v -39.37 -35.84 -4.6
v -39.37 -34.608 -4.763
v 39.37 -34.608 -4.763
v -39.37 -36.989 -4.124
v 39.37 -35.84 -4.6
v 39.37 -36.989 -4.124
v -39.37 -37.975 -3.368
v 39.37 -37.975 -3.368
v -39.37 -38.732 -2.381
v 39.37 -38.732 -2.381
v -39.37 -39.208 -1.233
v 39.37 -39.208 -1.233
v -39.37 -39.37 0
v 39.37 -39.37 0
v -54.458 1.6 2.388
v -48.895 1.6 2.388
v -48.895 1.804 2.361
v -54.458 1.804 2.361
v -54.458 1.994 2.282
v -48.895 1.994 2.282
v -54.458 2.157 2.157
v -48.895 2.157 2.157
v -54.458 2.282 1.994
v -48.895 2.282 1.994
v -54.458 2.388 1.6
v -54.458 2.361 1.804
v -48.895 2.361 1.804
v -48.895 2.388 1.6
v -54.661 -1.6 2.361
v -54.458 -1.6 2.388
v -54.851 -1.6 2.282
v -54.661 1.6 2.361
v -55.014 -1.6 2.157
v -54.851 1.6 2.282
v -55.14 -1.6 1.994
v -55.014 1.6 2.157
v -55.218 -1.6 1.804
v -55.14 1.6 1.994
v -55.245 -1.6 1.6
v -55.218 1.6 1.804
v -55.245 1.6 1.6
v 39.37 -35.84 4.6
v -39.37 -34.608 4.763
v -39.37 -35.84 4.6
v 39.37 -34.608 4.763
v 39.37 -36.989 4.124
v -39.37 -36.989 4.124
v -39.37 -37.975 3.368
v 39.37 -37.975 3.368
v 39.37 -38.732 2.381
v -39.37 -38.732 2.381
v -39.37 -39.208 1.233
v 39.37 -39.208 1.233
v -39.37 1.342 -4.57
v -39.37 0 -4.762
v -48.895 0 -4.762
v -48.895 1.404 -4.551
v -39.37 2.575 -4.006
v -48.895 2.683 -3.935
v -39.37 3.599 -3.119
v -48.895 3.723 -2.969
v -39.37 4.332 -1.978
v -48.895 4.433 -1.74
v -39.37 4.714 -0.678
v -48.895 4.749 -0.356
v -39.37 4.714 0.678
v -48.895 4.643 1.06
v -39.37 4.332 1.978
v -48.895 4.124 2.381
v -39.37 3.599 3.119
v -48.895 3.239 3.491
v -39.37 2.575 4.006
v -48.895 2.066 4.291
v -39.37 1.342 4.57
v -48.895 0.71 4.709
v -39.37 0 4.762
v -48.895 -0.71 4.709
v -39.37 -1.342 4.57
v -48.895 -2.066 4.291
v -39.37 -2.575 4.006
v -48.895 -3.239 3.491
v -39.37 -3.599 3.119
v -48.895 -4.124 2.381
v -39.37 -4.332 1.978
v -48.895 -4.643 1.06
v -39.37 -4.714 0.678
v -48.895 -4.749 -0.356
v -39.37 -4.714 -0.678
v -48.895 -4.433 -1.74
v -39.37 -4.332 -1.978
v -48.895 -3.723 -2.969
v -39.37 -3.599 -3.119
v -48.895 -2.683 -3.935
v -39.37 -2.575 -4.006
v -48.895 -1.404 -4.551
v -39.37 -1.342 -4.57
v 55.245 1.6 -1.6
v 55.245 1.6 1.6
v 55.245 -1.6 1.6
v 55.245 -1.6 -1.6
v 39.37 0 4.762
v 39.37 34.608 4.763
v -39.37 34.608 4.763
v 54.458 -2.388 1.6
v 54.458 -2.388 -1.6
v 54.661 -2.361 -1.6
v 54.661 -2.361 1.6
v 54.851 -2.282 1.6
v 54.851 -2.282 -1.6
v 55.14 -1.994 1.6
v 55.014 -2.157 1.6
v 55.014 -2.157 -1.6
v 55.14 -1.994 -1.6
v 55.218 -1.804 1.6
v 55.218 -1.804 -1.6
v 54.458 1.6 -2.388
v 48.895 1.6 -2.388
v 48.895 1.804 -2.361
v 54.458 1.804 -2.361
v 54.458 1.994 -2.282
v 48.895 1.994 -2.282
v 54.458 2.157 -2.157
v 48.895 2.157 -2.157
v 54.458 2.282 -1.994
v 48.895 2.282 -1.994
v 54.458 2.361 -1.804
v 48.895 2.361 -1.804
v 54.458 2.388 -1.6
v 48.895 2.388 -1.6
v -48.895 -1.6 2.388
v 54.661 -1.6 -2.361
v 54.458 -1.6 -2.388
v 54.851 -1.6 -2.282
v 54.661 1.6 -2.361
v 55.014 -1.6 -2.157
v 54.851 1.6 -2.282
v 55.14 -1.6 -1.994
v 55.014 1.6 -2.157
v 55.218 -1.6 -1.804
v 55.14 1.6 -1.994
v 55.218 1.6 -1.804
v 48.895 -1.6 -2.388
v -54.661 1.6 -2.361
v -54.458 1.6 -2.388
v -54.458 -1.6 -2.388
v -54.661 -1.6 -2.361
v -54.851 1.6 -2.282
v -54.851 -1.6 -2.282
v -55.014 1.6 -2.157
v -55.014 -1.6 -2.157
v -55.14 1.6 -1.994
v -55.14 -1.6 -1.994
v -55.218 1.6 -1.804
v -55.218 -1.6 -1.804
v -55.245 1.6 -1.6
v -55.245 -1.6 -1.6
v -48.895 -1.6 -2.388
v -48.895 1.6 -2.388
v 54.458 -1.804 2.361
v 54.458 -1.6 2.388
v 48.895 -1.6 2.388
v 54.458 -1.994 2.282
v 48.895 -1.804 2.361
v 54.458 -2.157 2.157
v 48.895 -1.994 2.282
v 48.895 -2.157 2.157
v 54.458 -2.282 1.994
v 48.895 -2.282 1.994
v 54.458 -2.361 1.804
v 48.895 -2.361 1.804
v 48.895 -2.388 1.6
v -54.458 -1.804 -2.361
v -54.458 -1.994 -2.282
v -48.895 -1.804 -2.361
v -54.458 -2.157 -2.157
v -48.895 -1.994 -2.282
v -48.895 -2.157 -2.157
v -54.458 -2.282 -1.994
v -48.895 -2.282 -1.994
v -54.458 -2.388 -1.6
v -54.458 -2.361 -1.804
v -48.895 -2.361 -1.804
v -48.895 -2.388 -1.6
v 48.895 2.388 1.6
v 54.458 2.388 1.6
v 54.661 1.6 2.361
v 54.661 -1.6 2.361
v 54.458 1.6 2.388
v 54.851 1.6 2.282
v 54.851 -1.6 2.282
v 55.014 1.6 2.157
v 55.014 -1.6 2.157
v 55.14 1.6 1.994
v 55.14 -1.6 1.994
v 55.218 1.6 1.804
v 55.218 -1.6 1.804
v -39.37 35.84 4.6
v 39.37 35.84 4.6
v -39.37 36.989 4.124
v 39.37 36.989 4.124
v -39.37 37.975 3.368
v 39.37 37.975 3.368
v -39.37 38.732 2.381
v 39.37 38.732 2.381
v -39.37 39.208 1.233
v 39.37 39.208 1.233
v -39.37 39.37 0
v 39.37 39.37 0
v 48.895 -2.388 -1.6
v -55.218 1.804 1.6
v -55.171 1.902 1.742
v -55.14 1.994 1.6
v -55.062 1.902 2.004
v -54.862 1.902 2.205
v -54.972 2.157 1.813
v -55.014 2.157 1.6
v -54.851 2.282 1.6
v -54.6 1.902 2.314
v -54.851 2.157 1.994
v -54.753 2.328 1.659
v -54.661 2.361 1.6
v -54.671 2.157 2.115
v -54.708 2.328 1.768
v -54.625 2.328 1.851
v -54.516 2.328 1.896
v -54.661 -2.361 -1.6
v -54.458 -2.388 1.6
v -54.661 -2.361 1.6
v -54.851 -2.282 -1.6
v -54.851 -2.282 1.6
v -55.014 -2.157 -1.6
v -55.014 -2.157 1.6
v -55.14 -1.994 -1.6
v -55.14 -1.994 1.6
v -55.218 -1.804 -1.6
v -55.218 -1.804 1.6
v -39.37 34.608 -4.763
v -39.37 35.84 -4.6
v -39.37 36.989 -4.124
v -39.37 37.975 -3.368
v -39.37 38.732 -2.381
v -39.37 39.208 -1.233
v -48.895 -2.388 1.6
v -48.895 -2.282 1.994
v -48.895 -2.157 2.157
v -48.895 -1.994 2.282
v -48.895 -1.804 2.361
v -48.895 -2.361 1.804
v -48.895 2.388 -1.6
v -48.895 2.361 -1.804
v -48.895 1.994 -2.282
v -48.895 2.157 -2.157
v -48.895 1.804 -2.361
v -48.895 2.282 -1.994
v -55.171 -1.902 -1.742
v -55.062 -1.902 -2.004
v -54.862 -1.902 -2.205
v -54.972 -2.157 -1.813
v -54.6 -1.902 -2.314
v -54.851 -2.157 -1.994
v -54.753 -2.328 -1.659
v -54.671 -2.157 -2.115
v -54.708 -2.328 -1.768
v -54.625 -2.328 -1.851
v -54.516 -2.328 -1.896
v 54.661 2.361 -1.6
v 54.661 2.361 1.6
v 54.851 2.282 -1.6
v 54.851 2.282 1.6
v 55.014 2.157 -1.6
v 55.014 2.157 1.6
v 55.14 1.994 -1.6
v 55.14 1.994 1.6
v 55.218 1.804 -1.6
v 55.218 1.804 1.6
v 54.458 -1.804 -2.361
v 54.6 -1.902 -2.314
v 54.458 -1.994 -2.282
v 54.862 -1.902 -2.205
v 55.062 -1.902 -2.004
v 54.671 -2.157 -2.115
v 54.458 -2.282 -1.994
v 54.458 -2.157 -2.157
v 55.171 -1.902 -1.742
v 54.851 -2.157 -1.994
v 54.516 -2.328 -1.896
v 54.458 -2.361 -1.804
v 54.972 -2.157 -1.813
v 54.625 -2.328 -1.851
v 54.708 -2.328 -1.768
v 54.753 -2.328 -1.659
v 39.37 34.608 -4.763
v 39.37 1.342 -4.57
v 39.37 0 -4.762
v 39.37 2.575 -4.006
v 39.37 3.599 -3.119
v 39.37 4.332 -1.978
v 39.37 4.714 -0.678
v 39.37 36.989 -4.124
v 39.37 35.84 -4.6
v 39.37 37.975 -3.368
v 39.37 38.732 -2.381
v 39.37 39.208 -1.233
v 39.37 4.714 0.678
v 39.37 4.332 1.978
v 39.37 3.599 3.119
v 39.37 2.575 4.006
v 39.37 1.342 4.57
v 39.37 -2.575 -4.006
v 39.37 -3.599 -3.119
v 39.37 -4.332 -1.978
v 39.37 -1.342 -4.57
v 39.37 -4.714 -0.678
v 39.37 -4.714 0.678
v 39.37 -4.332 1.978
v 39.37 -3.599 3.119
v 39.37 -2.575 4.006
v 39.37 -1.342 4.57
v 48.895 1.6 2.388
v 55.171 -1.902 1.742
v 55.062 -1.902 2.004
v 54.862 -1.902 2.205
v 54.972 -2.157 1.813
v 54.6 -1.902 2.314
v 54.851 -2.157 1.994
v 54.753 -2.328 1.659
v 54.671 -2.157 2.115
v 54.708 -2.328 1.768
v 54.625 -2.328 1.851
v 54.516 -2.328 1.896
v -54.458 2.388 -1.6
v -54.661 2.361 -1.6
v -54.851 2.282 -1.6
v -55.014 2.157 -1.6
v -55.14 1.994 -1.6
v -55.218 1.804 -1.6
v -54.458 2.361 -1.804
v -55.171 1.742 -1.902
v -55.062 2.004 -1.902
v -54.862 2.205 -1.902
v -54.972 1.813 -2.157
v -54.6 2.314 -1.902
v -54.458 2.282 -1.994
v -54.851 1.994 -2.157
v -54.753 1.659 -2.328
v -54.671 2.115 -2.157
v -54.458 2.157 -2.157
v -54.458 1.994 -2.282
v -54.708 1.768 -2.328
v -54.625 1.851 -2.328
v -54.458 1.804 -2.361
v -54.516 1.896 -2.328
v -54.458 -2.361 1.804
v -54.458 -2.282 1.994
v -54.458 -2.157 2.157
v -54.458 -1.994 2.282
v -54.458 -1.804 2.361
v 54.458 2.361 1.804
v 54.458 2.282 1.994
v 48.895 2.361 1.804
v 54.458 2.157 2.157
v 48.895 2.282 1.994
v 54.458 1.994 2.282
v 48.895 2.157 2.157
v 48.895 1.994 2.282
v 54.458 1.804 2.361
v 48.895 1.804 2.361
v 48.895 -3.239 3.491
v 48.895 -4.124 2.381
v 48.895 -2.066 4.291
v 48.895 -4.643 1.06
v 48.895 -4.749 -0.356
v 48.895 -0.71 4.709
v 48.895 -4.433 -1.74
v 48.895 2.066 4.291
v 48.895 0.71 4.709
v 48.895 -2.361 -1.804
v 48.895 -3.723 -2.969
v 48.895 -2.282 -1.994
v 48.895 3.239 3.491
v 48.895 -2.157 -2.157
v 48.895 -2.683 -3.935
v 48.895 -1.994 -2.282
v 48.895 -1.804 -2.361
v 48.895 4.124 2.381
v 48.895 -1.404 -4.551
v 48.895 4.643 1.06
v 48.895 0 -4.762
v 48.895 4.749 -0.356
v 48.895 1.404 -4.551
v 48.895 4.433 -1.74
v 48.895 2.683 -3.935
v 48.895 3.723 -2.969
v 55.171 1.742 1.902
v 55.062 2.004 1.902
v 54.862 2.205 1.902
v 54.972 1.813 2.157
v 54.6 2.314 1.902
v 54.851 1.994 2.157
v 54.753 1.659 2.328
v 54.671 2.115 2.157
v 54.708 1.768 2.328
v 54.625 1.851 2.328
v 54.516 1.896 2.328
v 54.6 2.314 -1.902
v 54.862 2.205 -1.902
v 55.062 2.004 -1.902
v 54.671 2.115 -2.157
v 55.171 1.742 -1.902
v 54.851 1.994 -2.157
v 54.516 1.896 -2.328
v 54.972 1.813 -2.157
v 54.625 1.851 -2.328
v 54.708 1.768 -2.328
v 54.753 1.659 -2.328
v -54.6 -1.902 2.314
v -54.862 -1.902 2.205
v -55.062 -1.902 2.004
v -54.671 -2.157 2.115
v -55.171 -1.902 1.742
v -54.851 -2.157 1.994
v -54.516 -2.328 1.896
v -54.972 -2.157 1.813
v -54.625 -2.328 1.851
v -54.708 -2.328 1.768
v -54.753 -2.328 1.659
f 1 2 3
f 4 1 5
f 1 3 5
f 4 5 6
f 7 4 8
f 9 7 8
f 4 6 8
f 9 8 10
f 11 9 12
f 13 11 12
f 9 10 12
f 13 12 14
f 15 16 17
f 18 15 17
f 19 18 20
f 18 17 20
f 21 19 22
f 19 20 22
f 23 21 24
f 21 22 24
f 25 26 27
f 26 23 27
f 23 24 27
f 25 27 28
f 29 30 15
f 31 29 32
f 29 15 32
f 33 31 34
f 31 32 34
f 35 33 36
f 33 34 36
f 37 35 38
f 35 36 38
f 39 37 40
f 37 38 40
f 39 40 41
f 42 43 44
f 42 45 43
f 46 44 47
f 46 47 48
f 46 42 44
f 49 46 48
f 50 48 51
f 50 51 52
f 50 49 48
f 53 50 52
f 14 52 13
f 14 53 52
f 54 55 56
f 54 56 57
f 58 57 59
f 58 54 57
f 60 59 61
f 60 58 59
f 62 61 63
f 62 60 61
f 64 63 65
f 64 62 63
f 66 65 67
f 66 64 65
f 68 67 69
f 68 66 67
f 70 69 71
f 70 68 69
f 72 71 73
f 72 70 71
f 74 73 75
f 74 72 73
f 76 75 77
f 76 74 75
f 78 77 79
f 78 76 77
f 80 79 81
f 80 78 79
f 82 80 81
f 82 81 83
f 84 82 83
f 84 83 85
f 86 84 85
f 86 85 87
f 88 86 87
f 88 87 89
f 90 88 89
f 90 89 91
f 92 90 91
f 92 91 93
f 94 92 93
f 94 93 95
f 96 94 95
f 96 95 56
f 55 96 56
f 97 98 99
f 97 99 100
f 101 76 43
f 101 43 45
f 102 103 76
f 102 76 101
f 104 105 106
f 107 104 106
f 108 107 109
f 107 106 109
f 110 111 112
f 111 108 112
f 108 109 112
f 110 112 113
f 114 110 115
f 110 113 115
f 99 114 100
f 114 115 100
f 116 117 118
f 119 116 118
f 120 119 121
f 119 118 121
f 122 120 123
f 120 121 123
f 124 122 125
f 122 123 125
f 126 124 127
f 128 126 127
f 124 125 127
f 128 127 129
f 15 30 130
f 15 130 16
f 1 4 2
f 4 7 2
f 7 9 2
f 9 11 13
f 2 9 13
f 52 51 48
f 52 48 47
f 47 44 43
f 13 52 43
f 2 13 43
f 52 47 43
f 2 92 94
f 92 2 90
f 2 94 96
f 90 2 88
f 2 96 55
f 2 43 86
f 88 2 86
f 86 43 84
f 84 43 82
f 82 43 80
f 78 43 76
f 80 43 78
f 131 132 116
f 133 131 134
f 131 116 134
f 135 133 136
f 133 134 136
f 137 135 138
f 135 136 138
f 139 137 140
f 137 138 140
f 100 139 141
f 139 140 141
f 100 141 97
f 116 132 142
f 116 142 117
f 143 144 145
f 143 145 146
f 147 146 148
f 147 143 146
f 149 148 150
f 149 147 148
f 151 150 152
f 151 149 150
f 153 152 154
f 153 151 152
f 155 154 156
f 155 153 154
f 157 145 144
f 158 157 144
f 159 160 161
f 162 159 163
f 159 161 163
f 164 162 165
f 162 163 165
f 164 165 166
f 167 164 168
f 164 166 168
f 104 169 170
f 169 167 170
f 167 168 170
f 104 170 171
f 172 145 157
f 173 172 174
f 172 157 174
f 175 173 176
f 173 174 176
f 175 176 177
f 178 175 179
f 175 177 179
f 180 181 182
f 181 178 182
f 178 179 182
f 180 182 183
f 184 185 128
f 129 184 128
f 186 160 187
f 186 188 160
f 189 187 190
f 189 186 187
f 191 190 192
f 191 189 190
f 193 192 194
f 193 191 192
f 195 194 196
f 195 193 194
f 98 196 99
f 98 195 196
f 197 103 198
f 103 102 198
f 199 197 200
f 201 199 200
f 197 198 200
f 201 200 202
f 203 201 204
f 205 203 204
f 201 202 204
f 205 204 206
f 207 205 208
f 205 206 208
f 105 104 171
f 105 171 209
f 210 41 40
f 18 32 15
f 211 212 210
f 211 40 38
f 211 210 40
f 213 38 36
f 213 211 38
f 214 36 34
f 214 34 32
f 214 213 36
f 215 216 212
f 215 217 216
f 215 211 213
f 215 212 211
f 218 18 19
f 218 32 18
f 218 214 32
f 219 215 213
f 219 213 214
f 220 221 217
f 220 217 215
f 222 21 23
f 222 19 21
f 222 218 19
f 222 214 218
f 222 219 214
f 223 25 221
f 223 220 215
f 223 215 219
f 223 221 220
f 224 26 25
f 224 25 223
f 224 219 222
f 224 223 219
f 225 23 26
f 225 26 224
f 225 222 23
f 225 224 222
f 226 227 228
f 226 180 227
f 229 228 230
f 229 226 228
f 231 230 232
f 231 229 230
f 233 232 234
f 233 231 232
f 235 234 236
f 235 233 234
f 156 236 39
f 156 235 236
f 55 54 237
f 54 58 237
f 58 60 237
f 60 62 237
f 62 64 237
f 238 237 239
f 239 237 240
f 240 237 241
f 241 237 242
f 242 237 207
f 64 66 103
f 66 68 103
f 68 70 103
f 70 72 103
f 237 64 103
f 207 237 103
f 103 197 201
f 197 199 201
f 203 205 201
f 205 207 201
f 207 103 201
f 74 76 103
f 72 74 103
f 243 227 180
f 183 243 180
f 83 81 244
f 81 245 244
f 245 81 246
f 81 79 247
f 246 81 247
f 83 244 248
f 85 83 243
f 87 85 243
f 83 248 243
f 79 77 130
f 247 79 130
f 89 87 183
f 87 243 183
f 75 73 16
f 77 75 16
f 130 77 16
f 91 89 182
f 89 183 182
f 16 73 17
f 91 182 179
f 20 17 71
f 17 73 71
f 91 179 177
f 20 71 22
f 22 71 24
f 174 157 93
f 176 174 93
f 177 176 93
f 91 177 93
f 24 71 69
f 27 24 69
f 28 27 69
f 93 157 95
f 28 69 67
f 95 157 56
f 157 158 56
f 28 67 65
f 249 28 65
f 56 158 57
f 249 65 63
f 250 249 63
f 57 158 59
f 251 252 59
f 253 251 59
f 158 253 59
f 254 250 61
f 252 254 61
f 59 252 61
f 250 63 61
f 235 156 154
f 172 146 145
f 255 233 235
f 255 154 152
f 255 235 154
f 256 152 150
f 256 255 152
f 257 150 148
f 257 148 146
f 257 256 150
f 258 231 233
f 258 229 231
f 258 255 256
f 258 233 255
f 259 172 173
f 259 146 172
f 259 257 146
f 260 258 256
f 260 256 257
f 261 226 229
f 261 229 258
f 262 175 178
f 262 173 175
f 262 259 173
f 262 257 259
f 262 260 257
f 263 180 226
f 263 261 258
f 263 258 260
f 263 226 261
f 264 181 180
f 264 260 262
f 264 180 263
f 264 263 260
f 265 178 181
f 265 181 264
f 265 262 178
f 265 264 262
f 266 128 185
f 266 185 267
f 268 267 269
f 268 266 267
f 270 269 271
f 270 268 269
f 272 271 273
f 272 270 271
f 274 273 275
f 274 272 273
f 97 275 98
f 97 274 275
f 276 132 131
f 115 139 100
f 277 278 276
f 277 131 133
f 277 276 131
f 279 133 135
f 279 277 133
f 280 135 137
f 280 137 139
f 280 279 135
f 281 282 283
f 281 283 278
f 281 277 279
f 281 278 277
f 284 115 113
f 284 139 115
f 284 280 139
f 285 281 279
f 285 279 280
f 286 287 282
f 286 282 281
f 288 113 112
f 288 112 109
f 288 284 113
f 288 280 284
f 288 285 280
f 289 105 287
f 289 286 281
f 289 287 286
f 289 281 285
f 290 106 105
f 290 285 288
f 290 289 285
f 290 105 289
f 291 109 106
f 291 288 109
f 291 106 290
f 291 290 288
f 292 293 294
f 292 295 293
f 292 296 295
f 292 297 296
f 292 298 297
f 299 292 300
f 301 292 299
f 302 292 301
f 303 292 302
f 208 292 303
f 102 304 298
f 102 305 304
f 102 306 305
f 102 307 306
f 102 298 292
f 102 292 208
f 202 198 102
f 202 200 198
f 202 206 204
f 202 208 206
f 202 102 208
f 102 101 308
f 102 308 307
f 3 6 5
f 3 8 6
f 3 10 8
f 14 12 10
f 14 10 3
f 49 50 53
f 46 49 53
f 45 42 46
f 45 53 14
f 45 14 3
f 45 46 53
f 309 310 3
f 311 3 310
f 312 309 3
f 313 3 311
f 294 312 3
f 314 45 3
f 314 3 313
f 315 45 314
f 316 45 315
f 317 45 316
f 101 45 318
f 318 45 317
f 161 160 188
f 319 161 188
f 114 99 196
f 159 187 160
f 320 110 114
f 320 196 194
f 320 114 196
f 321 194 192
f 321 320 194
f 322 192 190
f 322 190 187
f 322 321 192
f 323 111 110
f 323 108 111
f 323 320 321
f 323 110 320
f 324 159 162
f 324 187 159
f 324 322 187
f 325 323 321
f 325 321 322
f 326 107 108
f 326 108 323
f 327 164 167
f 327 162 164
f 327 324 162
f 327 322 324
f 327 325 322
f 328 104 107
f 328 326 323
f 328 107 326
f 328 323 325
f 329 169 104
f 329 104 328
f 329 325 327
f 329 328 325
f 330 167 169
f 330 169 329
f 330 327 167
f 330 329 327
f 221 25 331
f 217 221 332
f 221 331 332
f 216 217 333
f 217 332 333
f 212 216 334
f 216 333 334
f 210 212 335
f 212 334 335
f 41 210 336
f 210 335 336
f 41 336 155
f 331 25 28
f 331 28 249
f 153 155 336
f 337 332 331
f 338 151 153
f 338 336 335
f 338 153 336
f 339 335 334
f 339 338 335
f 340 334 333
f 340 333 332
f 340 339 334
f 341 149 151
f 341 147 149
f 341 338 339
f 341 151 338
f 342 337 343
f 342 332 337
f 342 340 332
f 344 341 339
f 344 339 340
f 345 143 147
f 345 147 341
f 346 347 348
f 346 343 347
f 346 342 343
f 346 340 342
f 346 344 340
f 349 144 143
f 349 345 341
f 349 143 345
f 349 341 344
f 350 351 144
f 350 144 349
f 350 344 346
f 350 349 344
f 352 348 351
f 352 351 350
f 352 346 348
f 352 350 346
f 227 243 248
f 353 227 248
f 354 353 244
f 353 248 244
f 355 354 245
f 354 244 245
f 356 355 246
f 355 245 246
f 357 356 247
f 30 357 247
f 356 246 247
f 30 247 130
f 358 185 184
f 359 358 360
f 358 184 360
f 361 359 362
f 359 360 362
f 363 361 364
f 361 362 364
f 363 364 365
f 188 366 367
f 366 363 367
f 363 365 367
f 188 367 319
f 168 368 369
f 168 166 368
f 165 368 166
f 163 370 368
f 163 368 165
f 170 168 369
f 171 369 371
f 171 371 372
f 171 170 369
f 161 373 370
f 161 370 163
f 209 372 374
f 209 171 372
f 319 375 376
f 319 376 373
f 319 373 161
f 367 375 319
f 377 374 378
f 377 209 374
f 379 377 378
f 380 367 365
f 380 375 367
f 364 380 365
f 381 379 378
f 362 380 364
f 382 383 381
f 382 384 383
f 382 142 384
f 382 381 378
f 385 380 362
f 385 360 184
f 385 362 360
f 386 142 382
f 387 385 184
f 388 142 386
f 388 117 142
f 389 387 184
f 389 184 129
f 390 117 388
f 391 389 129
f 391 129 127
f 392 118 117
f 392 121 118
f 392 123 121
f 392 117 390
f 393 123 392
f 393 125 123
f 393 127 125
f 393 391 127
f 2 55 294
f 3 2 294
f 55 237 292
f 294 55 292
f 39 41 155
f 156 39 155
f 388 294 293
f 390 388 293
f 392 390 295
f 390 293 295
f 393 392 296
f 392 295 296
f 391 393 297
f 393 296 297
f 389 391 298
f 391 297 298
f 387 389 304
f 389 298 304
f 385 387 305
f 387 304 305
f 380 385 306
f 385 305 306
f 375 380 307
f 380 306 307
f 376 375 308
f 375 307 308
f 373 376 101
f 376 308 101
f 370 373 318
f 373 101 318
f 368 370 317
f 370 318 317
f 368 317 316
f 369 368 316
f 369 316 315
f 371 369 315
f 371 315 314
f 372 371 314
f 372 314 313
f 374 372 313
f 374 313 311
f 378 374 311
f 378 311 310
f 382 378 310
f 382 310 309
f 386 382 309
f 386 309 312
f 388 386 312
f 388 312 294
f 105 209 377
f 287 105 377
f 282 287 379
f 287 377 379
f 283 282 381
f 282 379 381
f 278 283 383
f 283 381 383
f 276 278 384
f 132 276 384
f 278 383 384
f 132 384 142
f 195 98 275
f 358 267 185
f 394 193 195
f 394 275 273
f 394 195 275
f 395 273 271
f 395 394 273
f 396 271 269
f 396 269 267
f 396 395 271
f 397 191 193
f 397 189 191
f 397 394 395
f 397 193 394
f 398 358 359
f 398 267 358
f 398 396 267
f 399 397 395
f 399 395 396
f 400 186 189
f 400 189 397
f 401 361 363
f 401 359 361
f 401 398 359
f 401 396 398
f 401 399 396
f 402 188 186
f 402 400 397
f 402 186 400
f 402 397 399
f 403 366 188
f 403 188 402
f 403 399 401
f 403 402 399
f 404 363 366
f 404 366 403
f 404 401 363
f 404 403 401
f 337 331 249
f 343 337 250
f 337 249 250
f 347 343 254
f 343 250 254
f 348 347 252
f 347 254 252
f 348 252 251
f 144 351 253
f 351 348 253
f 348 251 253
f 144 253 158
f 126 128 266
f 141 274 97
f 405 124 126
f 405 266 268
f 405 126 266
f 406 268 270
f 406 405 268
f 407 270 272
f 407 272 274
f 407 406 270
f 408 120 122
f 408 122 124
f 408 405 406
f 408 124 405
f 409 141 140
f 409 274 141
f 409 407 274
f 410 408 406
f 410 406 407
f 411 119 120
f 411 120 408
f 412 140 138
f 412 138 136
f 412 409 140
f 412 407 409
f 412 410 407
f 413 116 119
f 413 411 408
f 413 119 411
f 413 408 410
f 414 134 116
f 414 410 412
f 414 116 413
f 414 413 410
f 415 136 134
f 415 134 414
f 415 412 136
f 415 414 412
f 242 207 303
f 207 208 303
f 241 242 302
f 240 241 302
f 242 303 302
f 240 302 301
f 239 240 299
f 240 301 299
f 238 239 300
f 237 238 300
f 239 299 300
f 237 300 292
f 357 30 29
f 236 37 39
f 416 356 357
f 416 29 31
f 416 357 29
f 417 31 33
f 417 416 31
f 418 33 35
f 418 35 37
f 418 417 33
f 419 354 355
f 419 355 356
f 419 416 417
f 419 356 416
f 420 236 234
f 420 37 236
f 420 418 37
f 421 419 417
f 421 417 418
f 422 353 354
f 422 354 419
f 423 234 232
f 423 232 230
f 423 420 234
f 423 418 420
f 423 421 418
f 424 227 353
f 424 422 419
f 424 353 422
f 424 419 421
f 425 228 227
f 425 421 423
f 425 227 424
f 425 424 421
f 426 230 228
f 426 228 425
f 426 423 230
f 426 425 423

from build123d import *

# Parameters (mm, degrees)
SKETCH1_W           = 78.74
SKETCH1_H           = 78.74
BOSS_EXTRUDE1_DEPTH = 4.7625
SKETCH2_R           = 4.7625
BOSS_EXTRUDE2_DEPTH = 9.525
SKETCH3_W           = 4.7752
SKETCH3_H           = 4.7752
BOSS_EXTRUDE3_DEPTH = 6.35
FILLET2_R           = 4.7625
FILLET3_R           = 0.7874
FILLET4_R           = 0.7874
FILLET5_R           = 0.7874


# Some blends are built 0.0001 mm under size
with BuildPart() as part:
    # Sketch1 → Boss-Extrude1 (new, symmetric)
    with BuildSketch(Plane.XY):
        Rectangle(SKETCH1_W, SKETCH1_H)
    extrude(amount=BOSS_EXTRUDE1_DEPTH, both=True)

    # Sketch2 → Boss-Extrude2 (add)
    with BuildSketch(Plane(origin=(39.37, 0, 0), x_dir=(0, 0, -1), z_dir=(1, 0, 0))):
        Circle(SKETCH2_R)
    boss_extrude2 = extrude(amount=BOSS_EXTRUDE2_DEPTH)

    # Sketch3 → Boss-Extrude3 (add)
    with BuildSketch(Plane(origin=(48.895, 0, 0), x_dir=(0, 0, -1), z_dir=(1, 0, 0))):
        Rectangle(SKETCH3_W, SKETCH3_H)
    boss_extrude3 = extrude(amount=BOSS_EXTRUDE3_DEPTH)

    # Mirror1: Boss-Extrude2, Boss-Extrude3 across plane
    add(boss_extrude2.mirror(Plane(origin=(0, 0, 0), x_dir=(0, 0, 1), z_dir=(1, 0, 0))))
    add(boss_extrude3.mirror(Plane(origin=(0, 0, 0), x_dir=(0, 0, 1), z_dir=(1, 0, 0))))

    # Fillet2
    fillet2_edges = [part.edges().sort_by_distance(p)[0] for p in [
        (0, -39.37, -4.7625),
        (0, -39.37, 4.7625),
        (0, 39.37, -4.7625),
        (0, 39.37, 4.7625),
    ]]
    fillet(fillet2_edges, radius=FILLET2_R - 0.0001)  # a hair under: the kernel refuses the full size

    # Fillet3
    fillet3_edges = [part.edges().sort_by_distance(p)[0] for p in [
        (-55.245, 0, -2.3876),
        (-55.245, -2.3876, 0),
        (-55.245, 0, 2.3876),
        (-55.245, 2.3876, 0),
    ]]
    fillet(fillet3_edges, radius=FILLET3_R)

    # Fillet4
    fillet4_edges = [part.edges().sort_by_distance(p)[0] for p in [
        (55.245, 0, -2.3876),
        (55.245, 2.3876, 0),
        (55.245, 0, 2.3876),
        (55.245, -2.3876, 0),
    ]]
    fillet(fillet4_edges, radius=FILLET4_R)

    # Fillet5
    # the kernel refuses this fillet: 0.7874 mm, written as the material it takes off along each edge
    with BuildSketch(Plane(origin=(54.4576, -1.6002, -1.6002), x_dir=(0, 0, -1), z_dir=(0, -1, 0))) as fillet5_piece_1_section:
        Polygon((0, 0), (FILLET5_R, 0), (FILLET5_R, FILLET5_R), (0, FILLET5_R), align=None)
    fillet5_piece_1 = extrude(amount=FILLET5_R, mode=Mode.PRIVATE)
    fillet5_piece_1 = fillet5_piece_1 - Plane(origin=(54.4576, -1.6002, -1.6002), x_dir=(-0.7071067811865475, 0, 0.7071067811865475), z_dir=(0, -1, 0)) * Sphere(FILLET5_R, mode=Mode.PRIVATE)
    add(fillet5_piece_1, mode=Mode.SUBTRACT)
    with BuildSketch(Plane(origin=(54.4576, -1.6002, 1.6002), x_dir=(0, 0, 1), z_dir=(0, -1, 0))) as fillet5_piece_2_section:
        Polygon((0, 0), (FILLET5_R, 0), (FILLET5_R, -FILLET5_R), (0, -FILLET5_R), align=None)
    fillet5_piece_2 = extrude(amount=FILLET5_R, mode=Mode.PRIVATE)
    fillet5_piece_2 = fillet5_piece_2 - Plane(origin=(54.4576, -1.6002, 1.6002), x_dir=(-0.7071067811865475, 0, -0.7071067811865475), z_dir=(0, -1, 0)) * Sphere(FILLET5_R, mode=Mode.PRIVATE)
    add(fillet5_piece_2, mode=Mode.SUBTRACT)
    with BuildSketch(Plane(origin=(54.4576, 1.6002, -1.6002), x_dir=(0, 1, 0), z_dir=(0, 0, -1))) as fillet5_piece_3_section:
        Polygon((0, 0), (FILLET5_R, 0), (FILLET5_R, FILLET5_R), (0, FILLET5_R), align=None)
    fillet5_piece_3 = extrude(amount=FILLET5_R, mode=Mode.PRIVATE)
    fillet5_piece_3 = fillet5_piece_3 - Plane(origin=(54.4576, 1.6002, -1.6002), x_dir=(-0.7071067811865475, -0.7071067811865475, 0), z_dir=(0, 0, -1)) * Sphere(FILLET5_R, mode=Mode.PRIVATE)
    add(fillet5_piece_3, mode=Mode.SUBTRACT)
    with BuildSketch(Plane(origin=(54.4576, 1.6002, 1.6002), x_dir=(0, 1, 0), z_dir=(0, 0, 1))) as fillet5_piece_4_section:
        Polygon((0, 0), (FILLET5_R, 0), (FILLET5_R, -FILLET5_R), (0, -FILLET5_R), align=None)
    fillet5_piece_4 = extrude(amount=FILLET5_R, mode=Mode.PRIVATE)
    fillet5_piece_4 = fillet5_piece_4 - Plane(origin=(54.4576, 1.6002, 1.6002), x_dir=(-0.7071067811865475, -0.7071067811865475, 0), z_dir=(0, 0, 1)) * Sphere(FILLET5_R, mode=Mode.PRIVATE)
    add(fillet5_piece_4, mode=Mode.SUBTRACT)
    with BuildSketch(Plane(origin=(-54.4576, 1.6002, 1.6002), x_dir=(0, 0, 1), z_dir=(0, 1, 0))) as fillet5_piece_5_section:
        Polygon((0, 0), (FILLET5_R, 0), (FILLET5_R, -FILLET5_R), (0, -FILLET5_R), align=None)
    fillet5_piece_5 = extrude(amount=FILLET5_R, mode=Mode.PRIVATE)
    fillet5_piece_5 = fillet5_piece_5 - Plane(origin=(-54.4576, 1.6002, 1.6002), x_dir=(0.7071067811865475, 0, -0.7071067811865475), z_dir=(0, 1, 0)) * Sphere(FILLET5_R, mode=Mode.PRIVATE)
    add(fillet5_piece_5, mode=Mode.SUBTRACT)
    with BuildSketch(Plane(origin=(-54.4576, 1.6002, -1.6002), x_dir=(0, 1, 0), z_dir=(0, 0, -1))) as fillet5_piece_6_section:
        Polygon((0, 0), (FILLET5_R, 0), (FILLET5_R, -FILLET5_R), (0, -FILLET5_R), align=None)
    fillet5_piece_6 = extrude(amount=FILLET5_R, mode=Mode.PRIVATE)
    fillet5_piece_6 = fillet5_piece_6 - Plane(origin=(-54.4576, 1.6002, -1.6002), x_dir=(0.7071067811865475, -0.7071067811865475, 0), z_dir=(0, 0, -1)) * Sphere(FILLET5_R, mode=Mode.PRIVATE)
    add(fillet5_piece_6, mode=Mode.SUBTRACT)
    with BuildSketch(Plane(origin=(-54.4576, -1.6002, 1.6002), x_dir=(0, 0, 1), z_dir=(0, -1, 0))) as fillet5_piece_7_section:
        Polygon((0, 0), (FILLET5_R, 0), (FILLET5_R, FILLET5_R), (0, FILLET5_R), align=None)
    fillet5_piece_7 = extrude(amount=FILLET5_R, mode=Mode.PRIVATE)
    fillet5_piece_7 = fillet5_piece_7 - Plane(origin=(-54.4576, -1.6002, 1.6002), x_dir=(0.7071067811865475, 0, -0.7071067811865475), z_dir=(0, -1, 0)) * Sphere(FILLET5_R, mode=Mode.PRIVATE)
    add(fillet5_piece_7, mode=Mode.SUBTRACT)
    with BuildSketch(Plane(origin=(-54.4576, -1.6002, -1.6002), x_dir=(0, 0, -1), z_dir=(0, -1, 0))) as fillet5_piece_8_section:
        Polygon((0, 0), (FILLET5_R, 0), (FILLET5_R, -FILLET5_R), (0, -FILLET5_R), align=None)
    fillet5_piece_8 = extrude(amount=FILLET5_R, mode=Mode.PRIVATE)
    fillet5_piece_8 = fillet5_piece_8 - Plane(origin=(-54.4576, -1.6002, -1.6002), x_dir=(0.7071067811865475, 0, 0.7071067811865475), z_dir=(0, -1, 0)) * Sphere(FILLET5_R, mode=Mode.PRIVATE)
    add(fillet5_piece_8, mode=Mode.SUBTRACT)
    with BuildSketch(Plane(origin=(48.895, -2.3876, -2.3876), x_dir=(0, 0, 1), z_dir=(1, 0, 0)), Plane(origin=(-48.895, -2.3876, 2.3876), x_dir=(0, 0, -1), z_dir=(-1, 0, 0)), Plane(origin=(48.895, 2.3876, -2.3876), x_dir=(0, -1, 0), z_dir=(1, 0, 0))) as fillet5_piece_9:
        with BuildLine():
            CenterArc((FILLET5_R, -FILLET5_R), FILLET5_R, 90, 90)
            Line((0, -FILLET5_R), (0, 0))
            Line((0, 0), (FILLET5_R, 0))
        make_face()
    extrude(amount=5.5626, mode=Mode.SUBTRACT)
    with BuildSketch(Plane(origin=(-48.895, -2.3876, -2.3876), x_dir=(0, 0, 1), z_dir=(-1, 0, 0)), Plane(origin=(-48.895, 2.3876, -2.3876), x_dir=(0, -1, 0), z_dir=(-1, 0, 0)), Plane(origin=(-48.895, 2.3876, 2.3876), x_dir=(0, 0, -1), z_dir=(-1, 0, 0)), Plane(origin=(48.895, 2.3876, 2.3876), x_dir=(0, -1, 0), z_dir=(1, 0, 0)), Plane(origin=(48.895, -2.3876, 2.3876), x_dir=(0, 0, -1), z_dir=(1, 0, 0))) as fillet5_piece_10:
        with BuildLine():
            CenterArc((FILLET5_R, FILLET5_R), FILLET5_R, 180, 90)
            Line((0, FILLET5_R), (0, 0))
            Line((0, 0), (FILLET5_R, 0))
        make_face()
    extrude(amount=5.5626, mode=Mode.SUBTRACT)


solid = part.part
